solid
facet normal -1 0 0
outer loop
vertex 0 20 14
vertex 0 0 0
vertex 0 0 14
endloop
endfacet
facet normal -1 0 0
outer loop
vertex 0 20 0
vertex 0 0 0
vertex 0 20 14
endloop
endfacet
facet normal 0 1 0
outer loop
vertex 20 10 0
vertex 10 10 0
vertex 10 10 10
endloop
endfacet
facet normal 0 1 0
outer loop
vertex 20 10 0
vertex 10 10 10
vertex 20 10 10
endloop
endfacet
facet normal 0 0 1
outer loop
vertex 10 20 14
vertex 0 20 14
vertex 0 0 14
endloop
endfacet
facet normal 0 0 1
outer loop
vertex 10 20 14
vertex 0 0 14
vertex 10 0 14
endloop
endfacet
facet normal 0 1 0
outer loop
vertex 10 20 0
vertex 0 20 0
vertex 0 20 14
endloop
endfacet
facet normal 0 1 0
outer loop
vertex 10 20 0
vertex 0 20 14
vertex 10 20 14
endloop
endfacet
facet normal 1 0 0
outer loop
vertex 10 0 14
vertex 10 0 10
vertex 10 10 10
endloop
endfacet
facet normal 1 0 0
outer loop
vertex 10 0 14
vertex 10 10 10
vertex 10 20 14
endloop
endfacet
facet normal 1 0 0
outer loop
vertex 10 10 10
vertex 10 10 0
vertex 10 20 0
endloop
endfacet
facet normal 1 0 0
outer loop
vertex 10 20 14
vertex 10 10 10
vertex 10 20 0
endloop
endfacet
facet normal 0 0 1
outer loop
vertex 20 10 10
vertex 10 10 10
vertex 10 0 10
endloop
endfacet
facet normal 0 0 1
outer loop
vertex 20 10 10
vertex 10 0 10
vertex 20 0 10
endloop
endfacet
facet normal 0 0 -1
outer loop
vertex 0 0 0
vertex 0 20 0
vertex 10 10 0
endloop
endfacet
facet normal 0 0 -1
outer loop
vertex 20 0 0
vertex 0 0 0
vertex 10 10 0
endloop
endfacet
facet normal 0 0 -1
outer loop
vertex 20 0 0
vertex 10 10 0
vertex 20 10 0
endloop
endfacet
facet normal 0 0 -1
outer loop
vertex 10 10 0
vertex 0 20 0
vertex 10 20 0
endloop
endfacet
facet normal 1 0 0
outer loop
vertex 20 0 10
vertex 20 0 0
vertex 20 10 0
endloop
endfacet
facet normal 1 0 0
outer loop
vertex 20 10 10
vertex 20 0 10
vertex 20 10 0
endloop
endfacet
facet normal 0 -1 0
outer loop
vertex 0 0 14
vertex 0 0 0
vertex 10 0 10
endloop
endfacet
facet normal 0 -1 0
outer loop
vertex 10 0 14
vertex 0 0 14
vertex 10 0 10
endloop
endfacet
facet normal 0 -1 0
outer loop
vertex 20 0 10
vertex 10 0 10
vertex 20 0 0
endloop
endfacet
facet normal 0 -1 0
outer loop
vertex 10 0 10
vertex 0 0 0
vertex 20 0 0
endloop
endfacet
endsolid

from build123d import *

# Parameters (mm, degrees)
BOX001_W     = 10
BOX001_H     = 10
BOX001_DEPTH = 10
BOX_W        = 10
BOX_H        = 20
BOX_DEPTH    = 14


with BuildPart() as box001:
    # Box001 → Box001 (new body)
    with BuildSketch(Plane(origin=(10, 0, 0), x_dir=(1, 0, 0), z_dir=(0, 0, 1))):
        with Locations((5, 5)):
            Rectangle(BOX001_W, BOX001_H)
    extrude(amount=BOX001_DEPTH)


with BuildPart() as fusion:
    # Box → Box (new body)
    with BuildSketch(Plane.XY):
        with Locations((5, 10)):
            Rectangle(BOX_W, BOX_H)
    extrude(amount=BOX_DEPTH)

    # Fusion: union Box001
    add(box001.part)


solid = fusion.part
